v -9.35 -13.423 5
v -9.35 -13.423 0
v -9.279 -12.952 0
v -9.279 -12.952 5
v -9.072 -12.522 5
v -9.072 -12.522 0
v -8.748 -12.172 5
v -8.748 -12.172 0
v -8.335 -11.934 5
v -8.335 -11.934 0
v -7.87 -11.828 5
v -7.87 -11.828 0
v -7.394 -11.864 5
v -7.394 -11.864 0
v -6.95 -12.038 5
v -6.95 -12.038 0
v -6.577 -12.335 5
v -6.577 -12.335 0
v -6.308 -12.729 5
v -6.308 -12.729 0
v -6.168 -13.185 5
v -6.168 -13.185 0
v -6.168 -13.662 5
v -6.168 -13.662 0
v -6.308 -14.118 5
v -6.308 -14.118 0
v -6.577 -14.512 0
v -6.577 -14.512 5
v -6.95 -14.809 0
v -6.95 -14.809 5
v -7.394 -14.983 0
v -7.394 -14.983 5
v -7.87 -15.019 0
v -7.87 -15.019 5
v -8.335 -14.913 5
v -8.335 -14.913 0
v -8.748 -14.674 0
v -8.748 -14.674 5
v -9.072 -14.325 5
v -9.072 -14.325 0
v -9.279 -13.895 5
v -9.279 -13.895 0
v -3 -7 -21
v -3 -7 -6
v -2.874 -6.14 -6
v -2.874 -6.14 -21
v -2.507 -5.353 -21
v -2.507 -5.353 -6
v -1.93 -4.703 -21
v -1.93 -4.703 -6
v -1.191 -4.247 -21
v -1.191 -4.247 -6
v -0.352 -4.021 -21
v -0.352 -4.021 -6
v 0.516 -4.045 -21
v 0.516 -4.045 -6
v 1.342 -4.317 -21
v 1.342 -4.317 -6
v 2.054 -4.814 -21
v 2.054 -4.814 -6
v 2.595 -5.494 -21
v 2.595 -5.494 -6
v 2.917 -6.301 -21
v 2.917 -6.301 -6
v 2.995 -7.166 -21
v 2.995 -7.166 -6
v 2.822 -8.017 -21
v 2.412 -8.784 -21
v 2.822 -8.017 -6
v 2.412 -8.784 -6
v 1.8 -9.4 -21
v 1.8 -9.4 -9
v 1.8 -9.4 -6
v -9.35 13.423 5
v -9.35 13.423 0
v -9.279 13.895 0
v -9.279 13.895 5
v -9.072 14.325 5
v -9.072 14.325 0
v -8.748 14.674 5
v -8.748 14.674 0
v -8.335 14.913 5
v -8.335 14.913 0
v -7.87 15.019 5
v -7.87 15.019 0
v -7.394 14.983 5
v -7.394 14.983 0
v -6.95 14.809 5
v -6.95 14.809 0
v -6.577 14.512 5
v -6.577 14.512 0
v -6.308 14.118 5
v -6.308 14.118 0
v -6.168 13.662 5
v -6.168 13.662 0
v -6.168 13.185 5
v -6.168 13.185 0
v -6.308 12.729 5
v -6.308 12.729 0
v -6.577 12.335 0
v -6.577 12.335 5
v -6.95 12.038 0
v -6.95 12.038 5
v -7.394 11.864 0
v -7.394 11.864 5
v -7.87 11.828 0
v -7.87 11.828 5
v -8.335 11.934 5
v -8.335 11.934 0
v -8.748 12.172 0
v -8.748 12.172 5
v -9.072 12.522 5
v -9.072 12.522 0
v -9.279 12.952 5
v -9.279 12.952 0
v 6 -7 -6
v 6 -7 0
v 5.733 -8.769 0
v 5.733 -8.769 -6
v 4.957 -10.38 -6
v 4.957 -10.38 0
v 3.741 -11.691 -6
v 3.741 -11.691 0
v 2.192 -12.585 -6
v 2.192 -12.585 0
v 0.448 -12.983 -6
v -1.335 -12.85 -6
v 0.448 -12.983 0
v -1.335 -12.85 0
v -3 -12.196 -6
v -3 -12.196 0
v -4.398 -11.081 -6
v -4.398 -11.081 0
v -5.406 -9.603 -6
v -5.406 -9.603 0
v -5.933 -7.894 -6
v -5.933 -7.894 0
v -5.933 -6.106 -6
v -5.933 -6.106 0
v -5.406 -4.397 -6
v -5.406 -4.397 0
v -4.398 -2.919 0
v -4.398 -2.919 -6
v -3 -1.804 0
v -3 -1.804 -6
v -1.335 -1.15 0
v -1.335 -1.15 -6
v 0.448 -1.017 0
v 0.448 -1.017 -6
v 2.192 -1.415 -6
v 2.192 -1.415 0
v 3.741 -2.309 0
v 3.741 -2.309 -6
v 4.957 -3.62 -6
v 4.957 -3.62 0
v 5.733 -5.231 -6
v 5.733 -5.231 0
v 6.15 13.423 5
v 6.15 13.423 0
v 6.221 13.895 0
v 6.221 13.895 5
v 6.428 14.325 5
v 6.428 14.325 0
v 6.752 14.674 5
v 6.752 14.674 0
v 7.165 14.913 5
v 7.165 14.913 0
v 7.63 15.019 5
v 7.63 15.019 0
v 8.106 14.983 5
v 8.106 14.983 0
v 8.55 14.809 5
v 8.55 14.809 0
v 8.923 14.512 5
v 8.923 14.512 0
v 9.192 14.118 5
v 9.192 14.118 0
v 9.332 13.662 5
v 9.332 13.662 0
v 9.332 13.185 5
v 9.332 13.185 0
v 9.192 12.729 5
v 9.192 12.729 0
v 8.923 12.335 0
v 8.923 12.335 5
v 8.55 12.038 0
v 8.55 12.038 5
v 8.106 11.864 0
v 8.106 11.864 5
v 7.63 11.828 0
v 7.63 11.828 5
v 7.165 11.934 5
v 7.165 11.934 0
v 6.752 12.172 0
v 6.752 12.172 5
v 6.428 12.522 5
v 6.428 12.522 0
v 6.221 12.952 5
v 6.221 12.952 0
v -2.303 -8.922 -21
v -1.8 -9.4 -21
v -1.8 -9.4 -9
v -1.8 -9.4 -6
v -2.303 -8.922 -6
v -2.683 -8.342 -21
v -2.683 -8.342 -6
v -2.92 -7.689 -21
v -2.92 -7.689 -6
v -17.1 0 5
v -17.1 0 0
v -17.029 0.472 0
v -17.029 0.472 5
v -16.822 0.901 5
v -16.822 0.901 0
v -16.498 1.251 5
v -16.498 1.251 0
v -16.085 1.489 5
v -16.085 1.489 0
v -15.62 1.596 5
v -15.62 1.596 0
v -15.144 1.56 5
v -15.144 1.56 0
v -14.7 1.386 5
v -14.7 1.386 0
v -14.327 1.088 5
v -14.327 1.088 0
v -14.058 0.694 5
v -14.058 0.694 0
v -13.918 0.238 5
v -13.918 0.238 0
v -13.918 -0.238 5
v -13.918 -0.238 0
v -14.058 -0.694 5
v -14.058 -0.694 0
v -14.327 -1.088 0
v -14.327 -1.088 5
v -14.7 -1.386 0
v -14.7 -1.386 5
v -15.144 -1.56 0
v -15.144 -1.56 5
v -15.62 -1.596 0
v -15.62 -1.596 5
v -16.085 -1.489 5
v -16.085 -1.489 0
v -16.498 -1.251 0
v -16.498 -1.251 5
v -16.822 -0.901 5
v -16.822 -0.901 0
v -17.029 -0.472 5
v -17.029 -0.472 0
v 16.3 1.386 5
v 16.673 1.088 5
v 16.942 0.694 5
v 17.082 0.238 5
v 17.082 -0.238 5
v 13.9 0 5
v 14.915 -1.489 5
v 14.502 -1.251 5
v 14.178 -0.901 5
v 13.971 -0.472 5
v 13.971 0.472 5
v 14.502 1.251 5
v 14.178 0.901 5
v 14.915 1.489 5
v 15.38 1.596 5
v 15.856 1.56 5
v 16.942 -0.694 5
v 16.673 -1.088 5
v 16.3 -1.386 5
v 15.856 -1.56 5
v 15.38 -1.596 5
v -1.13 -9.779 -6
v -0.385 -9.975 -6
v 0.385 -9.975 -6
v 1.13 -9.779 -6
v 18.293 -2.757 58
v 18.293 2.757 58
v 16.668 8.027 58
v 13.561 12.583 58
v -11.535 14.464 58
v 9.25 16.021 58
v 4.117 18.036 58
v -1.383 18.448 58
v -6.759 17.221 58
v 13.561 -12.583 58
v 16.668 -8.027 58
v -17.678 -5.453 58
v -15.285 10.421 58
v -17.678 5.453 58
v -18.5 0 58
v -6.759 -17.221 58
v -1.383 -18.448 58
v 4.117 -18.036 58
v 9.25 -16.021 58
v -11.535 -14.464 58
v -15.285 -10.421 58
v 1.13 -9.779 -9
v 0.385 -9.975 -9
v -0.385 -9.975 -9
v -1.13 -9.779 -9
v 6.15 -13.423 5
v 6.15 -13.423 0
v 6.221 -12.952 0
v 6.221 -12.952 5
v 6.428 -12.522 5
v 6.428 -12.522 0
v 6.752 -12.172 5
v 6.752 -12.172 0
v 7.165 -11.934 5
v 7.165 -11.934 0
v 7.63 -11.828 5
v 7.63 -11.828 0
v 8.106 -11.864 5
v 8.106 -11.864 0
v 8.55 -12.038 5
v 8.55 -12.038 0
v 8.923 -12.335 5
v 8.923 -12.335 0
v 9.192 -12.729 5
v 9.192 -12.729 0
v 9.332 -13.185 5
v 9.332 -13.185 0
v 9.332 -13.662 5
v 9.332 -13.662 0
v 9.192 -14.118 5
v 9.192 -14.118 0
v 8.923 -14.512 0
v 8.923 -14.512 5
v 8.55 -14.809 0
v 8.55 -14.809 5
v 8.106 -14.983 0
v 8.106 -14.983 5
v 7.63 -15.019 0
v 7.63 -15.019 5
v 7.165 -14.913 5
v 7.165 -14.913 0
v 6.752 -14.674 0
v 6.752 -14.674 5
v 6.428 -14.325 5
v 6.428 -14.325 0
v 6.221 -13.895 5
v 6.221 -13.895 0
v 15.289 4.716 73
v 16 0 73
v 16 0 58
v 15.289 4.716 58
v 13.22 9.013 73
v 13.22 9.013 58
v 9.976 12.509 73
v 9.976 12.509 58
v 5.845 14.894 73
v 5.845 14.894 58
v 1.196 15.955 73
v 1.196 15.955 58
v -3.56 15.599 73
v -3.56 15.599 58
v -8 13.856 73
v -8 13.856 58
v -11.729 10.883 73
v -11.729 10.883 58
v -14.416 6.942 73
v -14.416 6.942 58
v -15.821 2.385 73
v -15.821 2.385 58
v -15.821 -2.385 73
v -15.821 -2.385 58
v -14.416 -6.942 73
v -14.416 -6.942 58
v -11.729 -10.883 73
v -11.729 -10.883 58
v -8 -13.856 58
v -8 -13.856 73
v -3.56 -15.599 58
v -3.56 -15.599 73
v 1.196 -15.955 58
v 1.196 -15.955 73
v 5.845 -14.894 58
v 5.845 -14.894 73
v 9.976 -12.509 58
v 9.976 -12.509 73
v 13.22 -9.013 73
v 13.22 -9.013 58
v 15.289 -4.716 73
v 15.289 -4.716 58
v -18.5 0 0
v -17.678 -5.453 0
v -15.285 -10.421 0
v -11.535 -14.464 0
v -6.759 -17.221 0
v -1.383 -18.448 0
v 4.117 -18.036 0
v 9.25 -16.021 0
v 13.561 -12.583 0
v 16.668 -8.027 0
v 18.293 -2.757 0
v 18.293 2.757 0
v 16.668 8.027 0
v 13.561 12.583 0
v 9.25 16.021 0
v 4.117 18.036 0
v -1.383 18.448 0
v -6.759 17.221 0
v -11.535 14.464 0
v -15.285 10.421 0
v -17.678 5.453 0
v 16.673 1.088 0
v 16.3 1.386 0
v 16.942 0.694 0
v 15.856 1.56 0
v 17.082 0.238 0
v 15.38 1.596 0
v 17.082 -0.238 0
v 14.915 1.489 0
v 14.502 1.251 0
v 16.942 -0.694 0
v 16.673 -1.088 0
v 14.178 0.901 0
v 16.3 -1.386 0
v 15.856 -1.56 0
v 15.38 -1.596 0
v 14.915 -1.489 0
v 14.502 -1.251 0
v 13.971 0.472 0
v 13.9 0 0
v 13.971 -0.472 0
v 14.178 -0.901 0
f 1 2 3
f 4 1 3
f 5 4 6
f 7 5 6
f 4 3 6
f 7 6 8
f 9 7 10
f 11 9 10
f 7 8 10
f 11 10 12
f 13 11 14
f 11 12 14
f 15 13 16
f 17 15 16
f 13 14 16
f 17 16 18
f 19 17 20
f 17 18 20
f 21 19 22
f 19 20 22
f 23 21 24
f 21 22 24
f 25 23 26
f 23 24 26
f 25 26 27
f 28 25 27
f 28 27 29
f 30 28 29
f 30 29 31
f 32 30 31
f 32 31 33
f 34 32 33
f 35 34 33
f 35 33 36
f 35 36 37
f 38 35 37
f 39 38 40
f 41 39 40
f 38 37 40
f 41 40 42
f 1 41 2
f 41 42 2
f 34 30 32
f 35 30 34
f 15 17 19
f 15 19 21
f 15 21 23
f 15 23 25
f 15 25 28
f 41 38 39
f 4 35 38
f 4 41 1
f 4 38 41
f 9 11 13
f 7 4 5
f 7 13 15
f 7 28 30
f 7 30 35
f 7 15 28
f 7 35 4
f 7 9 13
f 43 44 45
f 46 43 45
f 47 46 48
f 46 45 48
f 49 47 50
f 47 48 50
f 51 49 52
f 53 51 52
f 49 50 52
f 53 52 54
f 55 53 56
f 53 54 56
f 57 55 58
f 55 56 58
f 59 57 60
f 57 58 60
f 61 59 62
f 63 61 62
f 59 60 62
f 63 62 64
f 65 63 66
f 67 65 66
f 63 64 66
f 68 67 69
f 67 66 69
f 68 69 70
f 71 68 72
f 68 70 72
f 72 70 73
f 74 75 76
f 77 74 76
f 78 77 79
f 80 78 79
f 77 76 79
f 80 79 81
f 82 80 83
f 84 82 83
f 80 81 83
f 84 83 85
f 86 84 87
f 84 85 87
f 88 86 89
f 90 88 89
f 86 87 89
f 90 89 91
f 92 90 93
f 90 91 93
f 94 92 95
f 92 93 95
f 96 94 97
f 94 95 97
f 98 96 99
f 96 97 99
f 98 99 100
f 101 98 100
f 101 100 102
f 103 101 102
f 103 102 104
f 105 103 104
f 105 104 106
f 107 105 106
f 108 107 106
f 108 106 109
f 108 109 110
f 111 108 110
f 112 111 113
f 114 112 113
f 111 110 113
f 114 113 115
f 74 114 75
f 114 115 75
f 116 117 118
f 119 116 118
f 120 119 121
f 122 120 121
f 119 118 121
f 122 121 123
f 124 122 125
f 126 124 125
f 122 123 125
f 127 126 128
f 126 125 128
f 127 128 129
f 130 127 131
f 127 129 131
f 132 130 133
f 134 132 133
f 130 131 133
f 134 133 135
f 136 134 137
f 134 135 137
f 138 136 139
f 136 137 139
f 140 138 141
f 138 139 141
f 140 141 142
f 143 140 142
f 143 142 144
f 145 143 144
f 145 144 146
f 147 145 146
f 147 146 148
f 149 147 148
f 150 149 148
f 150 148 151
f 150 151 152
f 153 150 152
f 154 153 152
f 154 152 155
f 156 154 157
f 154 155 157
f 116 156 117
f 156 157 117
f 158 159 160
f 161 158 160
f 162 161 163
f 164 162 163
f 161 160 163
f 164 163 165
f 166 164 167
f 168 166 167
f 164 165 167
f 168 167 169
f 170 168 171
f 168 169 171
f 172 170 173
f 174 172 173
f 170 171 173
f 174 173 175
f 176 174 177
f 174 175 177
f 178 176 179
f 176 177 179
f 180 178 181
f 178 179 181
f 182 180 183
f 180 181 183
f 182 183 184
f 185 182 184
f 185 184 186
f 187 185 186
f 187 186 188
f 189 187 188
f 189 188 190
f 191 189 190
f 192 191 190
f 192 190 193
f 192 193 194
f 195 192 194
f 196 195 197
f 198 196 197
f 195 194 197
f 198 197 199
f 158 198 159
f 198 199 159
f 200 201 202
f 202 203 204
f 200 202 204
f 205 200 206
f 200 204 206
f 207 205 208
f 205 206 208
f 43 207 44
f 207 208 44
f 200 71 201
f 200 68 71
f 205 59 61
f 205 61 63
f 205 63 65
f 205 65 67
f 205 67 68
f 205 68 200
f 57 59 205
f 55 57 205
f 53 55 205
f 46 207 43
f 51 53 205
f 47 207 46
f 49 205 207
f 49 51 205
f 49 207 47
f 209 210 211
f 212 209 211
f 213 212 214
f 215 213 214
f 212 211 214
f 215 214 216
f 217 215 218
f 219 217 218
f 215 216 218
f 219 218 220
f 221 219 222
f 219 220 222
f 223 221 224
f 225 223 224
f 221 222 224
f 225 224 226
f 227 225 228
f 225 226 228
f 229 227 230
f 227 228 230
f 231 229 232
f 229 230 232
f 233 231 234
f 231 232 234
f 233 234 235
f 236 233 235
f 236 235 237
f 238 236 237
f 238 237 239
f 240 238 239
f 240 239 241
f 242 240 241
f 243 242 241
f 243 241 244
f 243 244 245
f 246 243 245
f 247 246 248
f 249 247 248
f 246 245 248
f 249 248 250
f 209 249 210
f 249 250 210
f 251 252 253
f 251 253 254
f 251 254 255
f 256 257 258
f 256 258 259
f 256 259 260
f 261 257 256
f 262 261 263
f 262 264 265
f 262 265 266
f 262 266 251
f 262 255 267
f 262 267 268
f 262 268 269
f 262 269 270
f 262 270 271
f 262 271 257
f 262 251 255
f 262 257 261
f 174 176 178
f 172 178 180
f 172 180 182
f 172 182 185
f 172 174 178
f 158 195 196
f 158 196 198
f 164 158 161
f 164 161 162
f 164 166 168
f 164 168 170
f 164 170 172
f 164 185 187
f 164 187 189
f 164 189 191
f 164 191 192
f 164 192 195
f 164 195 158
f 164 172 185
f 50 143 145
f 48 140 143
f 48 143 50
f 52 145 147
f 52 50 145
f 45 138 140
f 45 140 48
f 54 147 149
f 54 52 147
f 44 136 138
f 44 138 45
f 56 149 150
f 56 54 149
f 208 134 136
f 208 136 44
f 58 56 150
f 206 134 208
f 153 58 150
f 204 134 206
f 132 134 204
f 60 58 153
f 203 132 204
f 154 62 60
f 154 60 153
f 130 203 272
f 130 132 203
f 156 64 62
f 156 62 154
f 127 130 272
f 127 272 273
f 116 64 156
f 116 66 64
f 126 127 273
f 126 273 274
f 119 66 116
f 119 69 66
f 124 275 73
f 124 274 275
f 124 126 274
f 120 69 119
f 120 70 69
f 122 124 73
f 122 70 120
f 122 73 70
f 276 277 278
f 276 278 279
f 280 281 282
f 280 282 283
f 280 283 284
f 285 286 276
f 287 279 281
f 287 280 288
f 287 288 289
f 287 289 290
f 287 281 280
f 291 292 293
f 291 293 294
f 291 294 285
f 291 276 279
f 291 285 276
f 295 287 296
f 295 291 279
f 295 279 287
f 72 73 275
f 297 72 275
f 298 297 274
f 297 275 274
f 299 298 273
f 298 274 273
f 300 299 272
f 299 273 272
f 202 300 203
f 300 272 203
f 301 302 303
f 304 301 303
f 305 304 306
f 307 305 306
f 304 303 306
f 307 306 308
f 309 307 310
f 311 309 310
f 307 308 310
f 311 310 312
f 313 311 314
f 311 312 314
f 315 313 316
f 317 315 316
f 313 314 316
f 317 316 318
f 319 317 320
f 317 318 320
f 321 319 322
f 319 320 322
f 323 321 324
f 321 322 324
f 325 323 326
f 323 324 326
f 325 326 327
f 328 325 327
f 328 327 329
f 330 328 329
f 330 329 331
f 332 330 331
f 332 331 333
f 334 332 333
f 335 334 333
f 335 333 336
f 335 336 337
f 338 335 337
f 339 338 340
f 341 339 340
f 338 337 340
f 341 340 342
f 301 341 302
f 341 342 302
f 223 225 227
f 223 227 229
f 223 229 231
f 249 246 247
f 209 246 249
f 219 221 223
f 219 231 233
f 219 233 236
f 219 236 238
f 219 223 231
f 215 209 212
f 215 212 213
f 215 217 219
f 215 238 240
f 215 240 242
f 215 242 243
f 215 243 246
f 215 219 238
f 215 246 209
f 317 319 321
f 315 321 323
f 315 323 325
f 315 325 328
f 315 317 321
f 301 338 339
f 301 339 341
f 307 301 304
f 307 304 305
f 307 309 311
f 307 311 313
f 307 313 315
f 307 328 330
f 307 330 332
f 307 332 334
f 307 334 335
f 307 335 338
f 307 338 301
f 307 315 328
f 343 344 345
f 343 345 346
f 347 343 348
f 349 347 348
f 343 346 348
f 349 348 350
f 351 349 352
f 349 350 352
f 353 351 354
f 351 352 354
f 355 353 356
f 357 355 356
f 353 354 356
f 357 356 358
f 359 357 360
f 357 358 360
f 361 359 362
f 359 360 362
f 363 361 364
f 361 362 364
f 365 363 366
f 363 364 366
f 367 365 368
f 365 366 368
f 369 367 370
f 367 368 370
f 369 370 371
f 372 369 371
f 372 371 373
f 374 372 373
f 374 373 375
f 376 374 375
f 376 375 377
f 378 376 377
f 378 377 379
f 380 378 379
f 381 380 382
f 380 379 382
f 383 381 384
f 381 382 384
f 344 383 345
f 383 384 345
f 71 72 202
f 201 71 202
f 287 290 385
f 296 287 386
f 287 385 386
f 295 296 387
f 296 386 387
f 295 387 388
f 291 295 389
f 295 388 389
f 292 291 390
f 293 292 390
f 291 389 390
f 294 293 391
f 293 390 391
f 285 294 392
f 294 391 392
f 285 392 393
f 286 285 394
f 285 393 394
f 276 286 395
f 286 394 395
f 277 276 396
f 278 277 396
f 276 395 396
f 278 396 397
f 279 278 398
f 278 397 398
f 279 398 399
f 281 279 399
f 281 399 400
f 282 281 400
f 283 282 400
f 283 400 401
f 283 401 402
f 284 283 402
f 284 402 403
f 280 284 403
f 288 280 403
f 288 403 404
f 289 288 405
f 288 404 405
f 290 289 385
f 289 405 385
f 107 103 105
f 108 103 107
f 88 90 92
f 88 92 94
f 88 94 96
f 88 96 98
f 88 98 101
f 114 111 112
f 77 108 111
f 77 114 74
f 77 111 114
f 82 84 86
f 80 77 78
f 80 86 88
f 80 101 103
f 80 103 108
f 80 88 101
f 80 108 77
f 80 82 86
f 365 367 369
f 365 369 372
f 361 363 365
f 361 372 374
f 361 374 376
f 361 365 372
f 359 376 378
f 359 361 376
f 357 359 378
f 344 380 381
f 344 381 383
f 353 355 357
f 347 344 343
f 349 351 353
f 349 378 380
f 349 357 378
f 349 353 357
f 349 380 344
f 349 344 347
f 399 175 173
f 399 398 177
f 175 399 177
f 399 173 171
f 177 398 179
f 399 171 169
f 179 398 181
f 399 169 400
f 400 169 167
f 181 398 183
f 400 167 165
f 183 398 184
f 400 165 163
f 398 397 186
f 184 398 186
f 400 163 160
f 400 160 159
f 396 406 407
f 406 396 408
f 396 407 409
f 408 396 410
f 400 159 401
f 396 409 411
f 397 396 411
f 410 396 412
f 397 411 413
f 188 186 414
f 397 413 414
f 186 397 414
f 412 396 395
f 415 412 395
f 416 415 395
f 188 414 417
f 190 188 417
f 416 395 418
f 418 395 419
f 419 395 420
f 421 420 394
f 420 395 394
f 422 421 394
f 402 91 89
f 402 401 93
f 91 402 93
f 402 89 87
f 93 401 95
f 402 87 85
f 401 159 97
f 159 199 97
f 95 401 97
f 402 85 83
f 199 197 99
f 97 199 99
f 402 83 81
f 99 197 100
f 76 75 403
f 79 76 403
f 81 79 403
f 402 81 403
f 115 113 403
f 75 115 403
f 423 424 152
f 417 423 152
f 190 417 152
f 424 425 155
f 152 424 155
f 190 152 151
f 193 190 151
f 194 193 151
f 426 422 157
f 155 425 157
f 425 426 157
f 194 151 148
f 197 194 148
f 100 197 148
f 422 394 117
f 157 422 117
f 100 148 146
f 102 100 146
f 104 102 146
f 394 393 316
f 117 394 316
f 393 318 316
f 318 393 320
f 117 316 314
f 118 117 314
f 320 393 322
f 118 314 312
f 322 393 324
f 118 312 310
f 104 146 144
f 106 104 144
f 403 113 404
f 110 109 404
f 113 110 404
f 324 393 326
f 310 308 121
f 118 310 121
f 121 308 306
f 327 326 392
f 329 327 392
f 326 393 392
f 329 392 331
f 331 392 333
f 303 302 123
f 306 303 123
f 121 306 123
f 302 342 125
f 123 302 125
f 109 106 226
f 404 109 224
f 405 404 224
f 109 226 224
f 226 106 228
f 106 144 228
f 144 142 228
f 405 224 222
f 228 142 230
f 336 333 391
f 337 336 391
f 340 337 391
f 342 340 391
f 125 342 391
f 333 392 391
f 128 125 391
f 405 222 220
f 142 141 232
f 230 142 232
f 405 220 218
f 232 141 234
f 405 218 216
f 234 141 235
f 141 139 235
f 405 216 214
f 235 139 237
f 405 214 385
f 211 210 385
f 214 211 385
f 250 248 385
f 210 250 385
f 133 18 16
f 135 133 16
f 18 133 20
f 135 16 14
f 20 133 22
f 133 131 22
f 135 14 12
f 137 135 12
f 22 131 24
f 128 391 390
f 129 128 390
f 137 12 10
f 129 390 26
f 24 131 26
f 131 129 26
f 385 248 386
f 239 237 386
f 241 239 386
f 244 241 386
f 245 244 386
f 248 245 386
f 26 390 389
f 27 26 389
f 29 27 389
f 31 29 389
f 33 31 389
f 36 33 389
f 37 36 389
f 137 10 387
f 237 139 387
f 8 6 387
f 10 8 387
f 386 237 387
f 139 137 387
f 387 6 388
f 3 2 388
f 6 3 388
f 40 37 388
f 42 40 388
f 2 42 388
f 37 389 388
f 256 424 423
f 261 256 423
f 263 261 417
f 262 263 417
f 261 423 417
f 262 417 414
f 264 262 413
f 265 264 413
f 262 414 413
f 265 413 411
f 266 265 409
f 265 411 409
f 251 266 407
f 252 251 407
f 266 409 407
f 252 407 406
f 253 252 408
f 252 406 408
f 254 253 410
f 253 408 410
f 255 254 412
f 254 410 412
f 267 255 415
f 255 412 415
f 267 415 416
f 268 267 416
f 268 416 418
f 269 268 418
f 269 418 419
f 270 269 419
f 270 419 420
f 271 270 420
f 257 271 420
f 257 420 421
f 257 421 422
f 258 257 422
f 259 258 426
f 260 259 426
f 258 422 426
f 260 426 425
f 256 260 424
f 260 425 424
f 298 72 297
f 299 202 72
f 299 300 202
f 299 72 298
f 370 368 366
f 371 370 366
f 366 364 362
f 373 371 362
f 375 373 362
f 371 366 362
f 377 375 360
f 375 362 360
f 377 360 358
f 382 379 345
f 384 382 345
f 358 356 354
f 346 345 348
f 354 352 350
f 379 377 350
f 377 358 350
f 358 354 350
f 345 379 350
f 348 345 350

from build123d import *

# Parameters (mm, degrees)
SKETCH_1_R          = 18.5
EXTRUDE_1_DEPTH     = 58
SKETCH_2_R          = 6
EXTRUDE_2_DEPTH     = 6
EXTRUDE_3_DEPTH     = 15
SKETCH_4_R          = 16
EXTRUDE_4_DEPTH     = 15
SKETCH_5_R          = 3
EXTRUDE_5_DEPTH     = 3
SKETCH_6_R          = 1.6
CUT_EXTRUDE_1_DEPTH = 5


with BuildPart() as part:
    # 草图1 → 凸台-拉伸1 (new body)
    with BuildSketch(Plane.XY):
        with Locations(Location((0, 0, 0), (0, 0, 180))):
            Circle(SKETCH_1_R)
    extrude(amount=EXTRUDE_1_DEPTH)

    # 草图2 → 凸台-拉伸2 (add)
    with BuildSketch(Plane(origin=(0, 0, 0), x_dir=(-1, 0, 0), z_dir=(0, 0, -1))):
        with Locations(Location((0, -7, 0), (0, 0, 180))):
            Circle(SKETCH_2_R)
    extrude(amount=EXTRUDE_2_DEPTH)

    # 草图3 → 凸台-拉伸3 (add)
    with BuildSketch(Plane(origin=(0, 0, -6), x_dir=(-1, 0, 0), z_dir=(0, 0, -1))):
        with BuildLine():
            Line((-1.8, -9.4), (1.8, -9.4))
            ThreePointArc((1.8, -9.4), (2.683281573, -8.341640786), (3, -7))
            ThreePointArc((3, -7), (-1.341640786, -4.316718427), (-1.8, -9.4))
        make_face()
    extrude(amount=EXTRUDE_3_DEPTH)

    # 草图5 → 凸台-拉伸5 (add)
    with BuildSketch(Plane(origin=(0, 0, -6), x_dir=(-1, 0, 0), z_dir=(0, 0, -1))):
        with Locations(Location((0, -7, 0), (0, 0, 233.130102354))):
            Circle(SKETCH_5_R)
    extrude(amount=EXTRUDE_5_DEPTH)

    # 草图6 → 切除-拉伸1 (cut)
    with BuildSketch(Plane(origin=(0, 0, 0), x_dir=(-1, 0, 0), z_dir=(0, 0, -1))):
        with Locations((-7.75, -13.423393759)):
            Circle(SKETCH_6_R)
        with Locations((-15.5, 0)):
            Circle(SKETCH_6_R)
        with Locations((-7.75, 13.423393759)):
            Circle(SKETCH_6_R)
        with Locations((7.75, 13.423393759)):
            Circle(SKETCH_6_R)
        with Locations((15.5, 0)):
            Circle(SKETCH_6_R)
        with Locations((7.75, -13.423393759)):
            Circle(SKETCH_6_R)
    extrude(amount=-CUT_EXTRUDE_1_DEPTH, mode=Mode.SUBTRACT)


with BuildPart() as body_2:
    # 草图4 → 凸台-拉伸4 (new body)
    with BuildSketch(Plane.XY.offset(58)):
        Circle(SKETCH_4_R)
    extrude(amount=EXTRUDE_4_DEPTH)


solid = Compound([part.part, body_2.part])
